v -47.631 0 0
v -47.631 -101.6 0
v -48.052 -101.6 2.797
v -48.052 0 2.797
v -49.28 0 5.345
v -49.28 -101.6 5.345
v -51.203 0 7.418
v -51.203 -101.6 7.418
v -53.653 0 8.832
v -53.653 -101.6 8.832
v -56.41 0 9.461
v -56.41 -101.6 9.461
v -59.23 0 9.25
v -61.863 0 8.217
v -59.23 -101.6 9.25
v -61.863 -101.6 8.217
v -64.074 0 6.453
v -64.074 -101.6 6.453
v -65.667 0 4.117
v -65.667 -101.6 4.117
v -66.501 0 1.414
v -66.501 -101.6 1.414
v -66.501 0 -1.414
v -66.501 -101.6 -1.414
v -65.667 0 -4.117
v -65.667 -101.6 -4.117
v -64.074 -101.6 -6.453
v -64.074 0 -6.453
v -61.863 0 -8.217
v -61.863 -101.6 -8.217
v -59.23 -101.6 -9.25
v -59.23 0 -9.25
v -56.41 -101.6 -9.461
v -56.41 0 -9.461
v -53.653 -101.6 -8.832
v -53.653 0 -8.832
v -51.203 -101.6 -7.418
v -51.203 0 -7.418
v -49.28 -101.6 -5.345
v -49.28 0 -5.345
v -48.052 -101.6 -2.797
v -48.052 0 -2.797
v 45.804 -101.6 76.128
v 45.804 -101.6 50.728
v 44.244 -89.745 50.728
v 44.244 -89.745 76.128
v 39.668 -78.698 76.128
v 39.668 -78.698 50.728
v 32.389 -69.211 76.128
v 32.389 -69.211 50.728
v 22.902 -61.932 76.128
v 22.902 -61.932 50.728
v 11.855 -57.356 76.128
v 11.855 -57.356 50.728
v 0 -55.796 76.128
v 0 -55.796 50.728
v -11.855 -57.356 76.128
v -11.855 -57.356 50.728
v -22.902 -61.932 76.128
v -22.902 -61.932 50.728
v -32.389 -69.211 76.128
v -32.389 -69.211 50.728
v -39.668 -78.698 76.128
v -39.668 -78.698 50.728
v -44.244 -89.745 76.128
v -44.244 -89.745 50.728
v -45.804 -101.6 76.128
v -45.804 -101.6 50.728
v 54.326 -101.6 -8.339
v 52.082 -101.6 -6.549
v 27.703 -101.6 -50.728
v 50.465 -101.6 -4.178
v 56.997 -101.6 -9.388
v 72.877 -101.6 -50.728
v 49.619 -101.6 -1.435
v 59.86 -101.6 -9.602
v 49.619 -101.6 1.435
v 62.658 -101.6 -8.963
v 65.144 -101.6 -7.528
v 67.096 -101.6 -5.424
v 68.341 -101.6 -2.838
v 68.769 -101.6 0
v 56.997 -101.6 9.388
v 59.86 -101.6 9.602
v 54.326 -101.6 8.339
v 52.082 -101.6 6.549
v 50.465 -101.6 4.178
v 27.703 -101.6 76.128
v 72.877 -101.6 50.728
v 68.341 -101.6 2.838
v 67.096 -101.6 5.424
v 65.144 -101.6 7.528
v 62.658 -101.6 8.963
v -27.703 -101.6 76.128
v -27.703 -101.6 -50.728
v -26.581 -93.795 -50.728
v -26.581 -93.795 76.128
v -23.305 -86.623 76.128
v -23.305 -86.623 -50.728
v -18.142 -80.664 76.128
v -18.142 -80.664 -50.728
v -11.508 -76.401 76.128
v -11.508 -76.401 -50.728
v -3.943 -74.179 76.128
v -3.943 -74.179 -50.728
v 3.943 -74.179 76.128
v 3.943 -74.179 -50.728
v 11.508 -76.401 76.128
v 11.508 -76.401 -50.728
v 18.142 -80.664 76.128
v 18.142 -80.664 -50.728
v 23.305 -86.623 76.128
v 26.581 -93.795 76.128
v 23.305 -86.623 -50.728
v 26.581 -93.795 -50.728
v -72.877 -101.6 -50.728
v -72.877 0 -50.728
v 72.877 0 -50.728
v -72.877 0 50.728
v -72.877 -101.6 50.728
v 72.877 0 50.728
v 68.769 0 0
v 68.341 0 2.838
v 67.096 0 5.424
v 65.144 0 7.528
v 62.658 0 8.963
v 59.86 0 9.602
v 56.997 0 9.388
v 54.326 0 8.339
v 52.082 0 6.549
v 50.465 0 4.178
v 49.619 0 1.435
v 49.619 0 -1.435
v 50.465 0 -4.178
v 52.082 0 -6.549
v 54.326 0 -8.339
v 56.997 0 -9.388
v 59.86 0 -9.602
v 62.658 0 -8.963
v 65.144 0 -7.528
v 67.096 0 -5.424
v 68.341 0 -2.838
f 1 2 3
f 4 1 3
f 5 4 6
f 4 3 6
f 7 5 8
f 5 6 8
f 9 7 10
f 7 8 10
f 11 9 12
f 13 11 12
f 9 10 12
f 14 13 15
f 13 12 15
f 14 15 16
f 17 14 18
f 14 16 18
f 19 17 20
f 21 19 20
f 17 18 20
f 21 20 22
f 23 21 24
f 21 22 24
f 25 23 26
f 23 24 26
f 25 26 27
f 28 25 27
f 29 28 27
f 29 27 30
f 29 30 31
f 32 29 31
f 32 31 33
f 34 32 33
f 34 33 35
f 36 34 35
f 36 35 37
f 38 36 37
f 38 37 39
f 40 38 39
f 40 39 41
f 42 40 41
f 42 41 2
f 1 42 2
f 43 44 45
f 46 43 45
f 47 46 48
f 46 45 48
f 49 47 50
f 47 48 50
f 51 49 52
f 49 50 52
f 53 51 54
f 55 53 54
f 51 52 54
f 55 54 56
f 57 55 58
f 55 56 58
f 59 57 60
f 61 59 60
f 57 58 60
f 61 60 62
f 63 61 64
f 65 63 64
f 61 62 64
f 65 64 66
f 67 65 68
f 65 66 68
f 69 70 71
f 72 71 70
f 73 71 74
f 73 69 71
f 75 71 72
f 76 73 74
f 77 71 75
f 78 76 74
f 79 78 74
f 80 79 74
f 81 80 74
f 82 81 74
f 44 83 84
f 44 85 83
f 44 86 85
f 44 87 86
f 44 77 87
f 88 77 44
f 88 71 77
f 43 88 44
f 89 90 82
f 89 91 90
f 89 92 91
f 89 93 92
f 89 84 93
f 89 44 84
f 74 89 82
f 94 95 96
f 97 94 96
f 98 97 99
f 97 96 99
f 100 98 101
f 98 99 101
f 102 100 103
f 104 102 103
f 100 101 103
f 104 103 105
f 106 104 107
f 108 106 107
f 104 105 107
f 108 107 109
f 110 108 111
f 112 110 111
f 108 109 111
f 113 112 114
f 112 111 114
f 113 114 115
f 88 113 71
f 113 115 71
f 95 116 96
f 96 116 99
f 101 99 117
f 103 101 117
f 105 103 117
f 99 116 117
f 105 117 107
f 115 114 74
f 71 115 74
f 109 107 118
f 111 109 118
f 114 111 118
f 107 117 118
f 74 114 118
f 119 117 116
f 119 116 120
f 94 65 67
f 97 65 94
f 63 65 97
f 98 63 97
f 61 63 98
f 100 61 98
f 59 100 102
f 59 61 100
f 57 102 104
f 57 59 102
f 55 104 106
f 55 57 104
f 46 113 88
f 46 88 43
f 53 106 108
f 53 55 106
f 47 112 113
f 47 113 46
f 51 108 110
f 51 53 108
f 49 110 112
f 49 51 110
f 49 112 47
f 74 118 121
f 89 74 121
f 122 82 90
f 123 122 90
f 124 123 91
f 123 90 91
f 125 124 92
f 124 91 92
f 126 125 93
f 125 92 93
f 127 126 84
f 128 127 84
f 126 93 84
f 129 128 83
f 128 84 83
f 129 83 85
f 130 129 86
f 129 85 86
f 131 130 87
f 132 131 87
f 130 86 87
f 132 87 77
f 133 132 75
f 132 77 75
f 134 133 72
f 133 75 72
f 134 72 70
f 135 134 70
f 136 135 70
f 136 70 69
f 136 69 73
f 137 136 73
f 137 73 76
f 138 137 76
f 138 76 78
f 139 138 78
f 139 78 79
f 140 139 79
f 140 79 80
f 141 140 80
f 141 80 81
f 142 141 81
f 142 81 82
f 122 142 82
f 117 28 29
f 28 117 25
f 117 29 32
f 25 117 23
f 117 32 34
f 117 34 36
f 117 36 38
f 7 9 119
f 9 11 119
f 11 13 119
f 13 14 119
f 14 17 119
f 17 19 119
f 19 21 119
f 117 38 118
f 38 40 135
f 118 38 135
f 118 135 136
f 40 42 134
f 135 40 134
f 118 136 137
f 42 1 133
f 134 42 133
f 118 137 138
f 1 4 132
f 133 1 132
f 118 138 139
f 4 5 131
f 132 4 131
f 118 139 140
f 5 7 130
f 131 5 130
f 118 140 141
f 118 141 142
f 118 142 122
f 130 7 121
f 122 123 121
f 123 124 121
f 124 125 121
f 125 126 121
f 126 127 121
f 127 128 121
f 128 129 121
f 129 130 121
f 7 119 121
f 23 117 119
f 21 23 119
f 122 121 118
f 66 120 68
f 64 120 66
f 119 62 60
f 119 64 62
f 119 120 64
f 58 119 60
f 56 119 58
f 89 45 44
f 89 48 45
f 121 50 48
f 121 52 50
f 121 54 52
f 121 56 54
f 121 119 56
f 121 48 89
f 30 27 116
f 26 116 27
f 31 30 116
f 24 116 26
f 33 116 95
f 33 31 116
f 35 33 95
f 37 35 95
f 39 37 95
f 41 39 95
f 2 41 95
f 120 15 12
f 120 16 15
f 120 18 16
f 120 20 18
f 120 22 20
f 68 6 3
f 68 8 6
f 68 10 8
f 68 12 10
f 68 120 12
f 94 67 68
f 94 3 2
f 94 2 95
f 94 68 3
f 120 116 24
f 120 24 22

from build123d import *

# Parameters (mm, degrees)
F0_W     = 145.7543373108
F0_H     = 101.455360651
F1_DEPTH = 101.6
F4_DEPTH = 25.4
F5_R     = 27.7028558339
F6_DEPTH = 127
F7_R     = 9.4879740748
F7_R_2   = 9.6289901624
F8_DEPTH = 152.4


with BuildPart() as f1:
    # F0 (on Front) → F1 (new body)
    with BuildSketch(Plane.XZ):
        Rectangle(F0_W, F0_H)
    extrude(amount=F1_DEPTH)

    # F3 (on face) + F2 (on face) → F4 (join)
    with BuildSketch(Plane.XY.offset(50.7276803255)):
        with BuildLine():
            Line((-45.8042988354, -101.6), (45.8042988354, -101.6))
            ThreePointArc((45.8042988354, -101.6), (0, -55.7957011646), (-45.8042988354, -101.6))
        make_face()
    with BuildSketch(Plane(origin=(0, 0, -50.7276803255), x_dir=(1, 0, 0), z_dir=(0, 0, -1))):
        with BuildLine():
            ThreePointArc((-46.1219863385, 101.6), (0, 55.4780136615), (46.1219863385, 101.6))
            Line((46.1219863385, 101.6), (-46.1219863385, 101.6))
        make_face()
    extrude(amount=F4_DEPTH, dir=(0, 0, 1))

    # F5 (on face) → F6 (cut)
    with BuildSketch(Plane(origin=(0, 0, -50.7276803255), x_dir=(1, 0, 0), z_dir=(0, 0, -1))):
        with Locations((0, 101.6)):
            Circle(F5_R)
    extrude(amount=-F6_DEPTH, mode=Mode.SUBTRACT)

    # F7 (on face) → F8 (cut)
    with BuildSketch(Plane.XZ.offset(101.6)):
        with Locations((-57.1189150214, 0)):
            Circle(F7_R)
        with Locations((59.1401457787, 0)):
            Circle(F7_R_2)
    extrude(amount=-F8_DEPTH, mode=Mode.SUBTRACT)


solid = f1.part
